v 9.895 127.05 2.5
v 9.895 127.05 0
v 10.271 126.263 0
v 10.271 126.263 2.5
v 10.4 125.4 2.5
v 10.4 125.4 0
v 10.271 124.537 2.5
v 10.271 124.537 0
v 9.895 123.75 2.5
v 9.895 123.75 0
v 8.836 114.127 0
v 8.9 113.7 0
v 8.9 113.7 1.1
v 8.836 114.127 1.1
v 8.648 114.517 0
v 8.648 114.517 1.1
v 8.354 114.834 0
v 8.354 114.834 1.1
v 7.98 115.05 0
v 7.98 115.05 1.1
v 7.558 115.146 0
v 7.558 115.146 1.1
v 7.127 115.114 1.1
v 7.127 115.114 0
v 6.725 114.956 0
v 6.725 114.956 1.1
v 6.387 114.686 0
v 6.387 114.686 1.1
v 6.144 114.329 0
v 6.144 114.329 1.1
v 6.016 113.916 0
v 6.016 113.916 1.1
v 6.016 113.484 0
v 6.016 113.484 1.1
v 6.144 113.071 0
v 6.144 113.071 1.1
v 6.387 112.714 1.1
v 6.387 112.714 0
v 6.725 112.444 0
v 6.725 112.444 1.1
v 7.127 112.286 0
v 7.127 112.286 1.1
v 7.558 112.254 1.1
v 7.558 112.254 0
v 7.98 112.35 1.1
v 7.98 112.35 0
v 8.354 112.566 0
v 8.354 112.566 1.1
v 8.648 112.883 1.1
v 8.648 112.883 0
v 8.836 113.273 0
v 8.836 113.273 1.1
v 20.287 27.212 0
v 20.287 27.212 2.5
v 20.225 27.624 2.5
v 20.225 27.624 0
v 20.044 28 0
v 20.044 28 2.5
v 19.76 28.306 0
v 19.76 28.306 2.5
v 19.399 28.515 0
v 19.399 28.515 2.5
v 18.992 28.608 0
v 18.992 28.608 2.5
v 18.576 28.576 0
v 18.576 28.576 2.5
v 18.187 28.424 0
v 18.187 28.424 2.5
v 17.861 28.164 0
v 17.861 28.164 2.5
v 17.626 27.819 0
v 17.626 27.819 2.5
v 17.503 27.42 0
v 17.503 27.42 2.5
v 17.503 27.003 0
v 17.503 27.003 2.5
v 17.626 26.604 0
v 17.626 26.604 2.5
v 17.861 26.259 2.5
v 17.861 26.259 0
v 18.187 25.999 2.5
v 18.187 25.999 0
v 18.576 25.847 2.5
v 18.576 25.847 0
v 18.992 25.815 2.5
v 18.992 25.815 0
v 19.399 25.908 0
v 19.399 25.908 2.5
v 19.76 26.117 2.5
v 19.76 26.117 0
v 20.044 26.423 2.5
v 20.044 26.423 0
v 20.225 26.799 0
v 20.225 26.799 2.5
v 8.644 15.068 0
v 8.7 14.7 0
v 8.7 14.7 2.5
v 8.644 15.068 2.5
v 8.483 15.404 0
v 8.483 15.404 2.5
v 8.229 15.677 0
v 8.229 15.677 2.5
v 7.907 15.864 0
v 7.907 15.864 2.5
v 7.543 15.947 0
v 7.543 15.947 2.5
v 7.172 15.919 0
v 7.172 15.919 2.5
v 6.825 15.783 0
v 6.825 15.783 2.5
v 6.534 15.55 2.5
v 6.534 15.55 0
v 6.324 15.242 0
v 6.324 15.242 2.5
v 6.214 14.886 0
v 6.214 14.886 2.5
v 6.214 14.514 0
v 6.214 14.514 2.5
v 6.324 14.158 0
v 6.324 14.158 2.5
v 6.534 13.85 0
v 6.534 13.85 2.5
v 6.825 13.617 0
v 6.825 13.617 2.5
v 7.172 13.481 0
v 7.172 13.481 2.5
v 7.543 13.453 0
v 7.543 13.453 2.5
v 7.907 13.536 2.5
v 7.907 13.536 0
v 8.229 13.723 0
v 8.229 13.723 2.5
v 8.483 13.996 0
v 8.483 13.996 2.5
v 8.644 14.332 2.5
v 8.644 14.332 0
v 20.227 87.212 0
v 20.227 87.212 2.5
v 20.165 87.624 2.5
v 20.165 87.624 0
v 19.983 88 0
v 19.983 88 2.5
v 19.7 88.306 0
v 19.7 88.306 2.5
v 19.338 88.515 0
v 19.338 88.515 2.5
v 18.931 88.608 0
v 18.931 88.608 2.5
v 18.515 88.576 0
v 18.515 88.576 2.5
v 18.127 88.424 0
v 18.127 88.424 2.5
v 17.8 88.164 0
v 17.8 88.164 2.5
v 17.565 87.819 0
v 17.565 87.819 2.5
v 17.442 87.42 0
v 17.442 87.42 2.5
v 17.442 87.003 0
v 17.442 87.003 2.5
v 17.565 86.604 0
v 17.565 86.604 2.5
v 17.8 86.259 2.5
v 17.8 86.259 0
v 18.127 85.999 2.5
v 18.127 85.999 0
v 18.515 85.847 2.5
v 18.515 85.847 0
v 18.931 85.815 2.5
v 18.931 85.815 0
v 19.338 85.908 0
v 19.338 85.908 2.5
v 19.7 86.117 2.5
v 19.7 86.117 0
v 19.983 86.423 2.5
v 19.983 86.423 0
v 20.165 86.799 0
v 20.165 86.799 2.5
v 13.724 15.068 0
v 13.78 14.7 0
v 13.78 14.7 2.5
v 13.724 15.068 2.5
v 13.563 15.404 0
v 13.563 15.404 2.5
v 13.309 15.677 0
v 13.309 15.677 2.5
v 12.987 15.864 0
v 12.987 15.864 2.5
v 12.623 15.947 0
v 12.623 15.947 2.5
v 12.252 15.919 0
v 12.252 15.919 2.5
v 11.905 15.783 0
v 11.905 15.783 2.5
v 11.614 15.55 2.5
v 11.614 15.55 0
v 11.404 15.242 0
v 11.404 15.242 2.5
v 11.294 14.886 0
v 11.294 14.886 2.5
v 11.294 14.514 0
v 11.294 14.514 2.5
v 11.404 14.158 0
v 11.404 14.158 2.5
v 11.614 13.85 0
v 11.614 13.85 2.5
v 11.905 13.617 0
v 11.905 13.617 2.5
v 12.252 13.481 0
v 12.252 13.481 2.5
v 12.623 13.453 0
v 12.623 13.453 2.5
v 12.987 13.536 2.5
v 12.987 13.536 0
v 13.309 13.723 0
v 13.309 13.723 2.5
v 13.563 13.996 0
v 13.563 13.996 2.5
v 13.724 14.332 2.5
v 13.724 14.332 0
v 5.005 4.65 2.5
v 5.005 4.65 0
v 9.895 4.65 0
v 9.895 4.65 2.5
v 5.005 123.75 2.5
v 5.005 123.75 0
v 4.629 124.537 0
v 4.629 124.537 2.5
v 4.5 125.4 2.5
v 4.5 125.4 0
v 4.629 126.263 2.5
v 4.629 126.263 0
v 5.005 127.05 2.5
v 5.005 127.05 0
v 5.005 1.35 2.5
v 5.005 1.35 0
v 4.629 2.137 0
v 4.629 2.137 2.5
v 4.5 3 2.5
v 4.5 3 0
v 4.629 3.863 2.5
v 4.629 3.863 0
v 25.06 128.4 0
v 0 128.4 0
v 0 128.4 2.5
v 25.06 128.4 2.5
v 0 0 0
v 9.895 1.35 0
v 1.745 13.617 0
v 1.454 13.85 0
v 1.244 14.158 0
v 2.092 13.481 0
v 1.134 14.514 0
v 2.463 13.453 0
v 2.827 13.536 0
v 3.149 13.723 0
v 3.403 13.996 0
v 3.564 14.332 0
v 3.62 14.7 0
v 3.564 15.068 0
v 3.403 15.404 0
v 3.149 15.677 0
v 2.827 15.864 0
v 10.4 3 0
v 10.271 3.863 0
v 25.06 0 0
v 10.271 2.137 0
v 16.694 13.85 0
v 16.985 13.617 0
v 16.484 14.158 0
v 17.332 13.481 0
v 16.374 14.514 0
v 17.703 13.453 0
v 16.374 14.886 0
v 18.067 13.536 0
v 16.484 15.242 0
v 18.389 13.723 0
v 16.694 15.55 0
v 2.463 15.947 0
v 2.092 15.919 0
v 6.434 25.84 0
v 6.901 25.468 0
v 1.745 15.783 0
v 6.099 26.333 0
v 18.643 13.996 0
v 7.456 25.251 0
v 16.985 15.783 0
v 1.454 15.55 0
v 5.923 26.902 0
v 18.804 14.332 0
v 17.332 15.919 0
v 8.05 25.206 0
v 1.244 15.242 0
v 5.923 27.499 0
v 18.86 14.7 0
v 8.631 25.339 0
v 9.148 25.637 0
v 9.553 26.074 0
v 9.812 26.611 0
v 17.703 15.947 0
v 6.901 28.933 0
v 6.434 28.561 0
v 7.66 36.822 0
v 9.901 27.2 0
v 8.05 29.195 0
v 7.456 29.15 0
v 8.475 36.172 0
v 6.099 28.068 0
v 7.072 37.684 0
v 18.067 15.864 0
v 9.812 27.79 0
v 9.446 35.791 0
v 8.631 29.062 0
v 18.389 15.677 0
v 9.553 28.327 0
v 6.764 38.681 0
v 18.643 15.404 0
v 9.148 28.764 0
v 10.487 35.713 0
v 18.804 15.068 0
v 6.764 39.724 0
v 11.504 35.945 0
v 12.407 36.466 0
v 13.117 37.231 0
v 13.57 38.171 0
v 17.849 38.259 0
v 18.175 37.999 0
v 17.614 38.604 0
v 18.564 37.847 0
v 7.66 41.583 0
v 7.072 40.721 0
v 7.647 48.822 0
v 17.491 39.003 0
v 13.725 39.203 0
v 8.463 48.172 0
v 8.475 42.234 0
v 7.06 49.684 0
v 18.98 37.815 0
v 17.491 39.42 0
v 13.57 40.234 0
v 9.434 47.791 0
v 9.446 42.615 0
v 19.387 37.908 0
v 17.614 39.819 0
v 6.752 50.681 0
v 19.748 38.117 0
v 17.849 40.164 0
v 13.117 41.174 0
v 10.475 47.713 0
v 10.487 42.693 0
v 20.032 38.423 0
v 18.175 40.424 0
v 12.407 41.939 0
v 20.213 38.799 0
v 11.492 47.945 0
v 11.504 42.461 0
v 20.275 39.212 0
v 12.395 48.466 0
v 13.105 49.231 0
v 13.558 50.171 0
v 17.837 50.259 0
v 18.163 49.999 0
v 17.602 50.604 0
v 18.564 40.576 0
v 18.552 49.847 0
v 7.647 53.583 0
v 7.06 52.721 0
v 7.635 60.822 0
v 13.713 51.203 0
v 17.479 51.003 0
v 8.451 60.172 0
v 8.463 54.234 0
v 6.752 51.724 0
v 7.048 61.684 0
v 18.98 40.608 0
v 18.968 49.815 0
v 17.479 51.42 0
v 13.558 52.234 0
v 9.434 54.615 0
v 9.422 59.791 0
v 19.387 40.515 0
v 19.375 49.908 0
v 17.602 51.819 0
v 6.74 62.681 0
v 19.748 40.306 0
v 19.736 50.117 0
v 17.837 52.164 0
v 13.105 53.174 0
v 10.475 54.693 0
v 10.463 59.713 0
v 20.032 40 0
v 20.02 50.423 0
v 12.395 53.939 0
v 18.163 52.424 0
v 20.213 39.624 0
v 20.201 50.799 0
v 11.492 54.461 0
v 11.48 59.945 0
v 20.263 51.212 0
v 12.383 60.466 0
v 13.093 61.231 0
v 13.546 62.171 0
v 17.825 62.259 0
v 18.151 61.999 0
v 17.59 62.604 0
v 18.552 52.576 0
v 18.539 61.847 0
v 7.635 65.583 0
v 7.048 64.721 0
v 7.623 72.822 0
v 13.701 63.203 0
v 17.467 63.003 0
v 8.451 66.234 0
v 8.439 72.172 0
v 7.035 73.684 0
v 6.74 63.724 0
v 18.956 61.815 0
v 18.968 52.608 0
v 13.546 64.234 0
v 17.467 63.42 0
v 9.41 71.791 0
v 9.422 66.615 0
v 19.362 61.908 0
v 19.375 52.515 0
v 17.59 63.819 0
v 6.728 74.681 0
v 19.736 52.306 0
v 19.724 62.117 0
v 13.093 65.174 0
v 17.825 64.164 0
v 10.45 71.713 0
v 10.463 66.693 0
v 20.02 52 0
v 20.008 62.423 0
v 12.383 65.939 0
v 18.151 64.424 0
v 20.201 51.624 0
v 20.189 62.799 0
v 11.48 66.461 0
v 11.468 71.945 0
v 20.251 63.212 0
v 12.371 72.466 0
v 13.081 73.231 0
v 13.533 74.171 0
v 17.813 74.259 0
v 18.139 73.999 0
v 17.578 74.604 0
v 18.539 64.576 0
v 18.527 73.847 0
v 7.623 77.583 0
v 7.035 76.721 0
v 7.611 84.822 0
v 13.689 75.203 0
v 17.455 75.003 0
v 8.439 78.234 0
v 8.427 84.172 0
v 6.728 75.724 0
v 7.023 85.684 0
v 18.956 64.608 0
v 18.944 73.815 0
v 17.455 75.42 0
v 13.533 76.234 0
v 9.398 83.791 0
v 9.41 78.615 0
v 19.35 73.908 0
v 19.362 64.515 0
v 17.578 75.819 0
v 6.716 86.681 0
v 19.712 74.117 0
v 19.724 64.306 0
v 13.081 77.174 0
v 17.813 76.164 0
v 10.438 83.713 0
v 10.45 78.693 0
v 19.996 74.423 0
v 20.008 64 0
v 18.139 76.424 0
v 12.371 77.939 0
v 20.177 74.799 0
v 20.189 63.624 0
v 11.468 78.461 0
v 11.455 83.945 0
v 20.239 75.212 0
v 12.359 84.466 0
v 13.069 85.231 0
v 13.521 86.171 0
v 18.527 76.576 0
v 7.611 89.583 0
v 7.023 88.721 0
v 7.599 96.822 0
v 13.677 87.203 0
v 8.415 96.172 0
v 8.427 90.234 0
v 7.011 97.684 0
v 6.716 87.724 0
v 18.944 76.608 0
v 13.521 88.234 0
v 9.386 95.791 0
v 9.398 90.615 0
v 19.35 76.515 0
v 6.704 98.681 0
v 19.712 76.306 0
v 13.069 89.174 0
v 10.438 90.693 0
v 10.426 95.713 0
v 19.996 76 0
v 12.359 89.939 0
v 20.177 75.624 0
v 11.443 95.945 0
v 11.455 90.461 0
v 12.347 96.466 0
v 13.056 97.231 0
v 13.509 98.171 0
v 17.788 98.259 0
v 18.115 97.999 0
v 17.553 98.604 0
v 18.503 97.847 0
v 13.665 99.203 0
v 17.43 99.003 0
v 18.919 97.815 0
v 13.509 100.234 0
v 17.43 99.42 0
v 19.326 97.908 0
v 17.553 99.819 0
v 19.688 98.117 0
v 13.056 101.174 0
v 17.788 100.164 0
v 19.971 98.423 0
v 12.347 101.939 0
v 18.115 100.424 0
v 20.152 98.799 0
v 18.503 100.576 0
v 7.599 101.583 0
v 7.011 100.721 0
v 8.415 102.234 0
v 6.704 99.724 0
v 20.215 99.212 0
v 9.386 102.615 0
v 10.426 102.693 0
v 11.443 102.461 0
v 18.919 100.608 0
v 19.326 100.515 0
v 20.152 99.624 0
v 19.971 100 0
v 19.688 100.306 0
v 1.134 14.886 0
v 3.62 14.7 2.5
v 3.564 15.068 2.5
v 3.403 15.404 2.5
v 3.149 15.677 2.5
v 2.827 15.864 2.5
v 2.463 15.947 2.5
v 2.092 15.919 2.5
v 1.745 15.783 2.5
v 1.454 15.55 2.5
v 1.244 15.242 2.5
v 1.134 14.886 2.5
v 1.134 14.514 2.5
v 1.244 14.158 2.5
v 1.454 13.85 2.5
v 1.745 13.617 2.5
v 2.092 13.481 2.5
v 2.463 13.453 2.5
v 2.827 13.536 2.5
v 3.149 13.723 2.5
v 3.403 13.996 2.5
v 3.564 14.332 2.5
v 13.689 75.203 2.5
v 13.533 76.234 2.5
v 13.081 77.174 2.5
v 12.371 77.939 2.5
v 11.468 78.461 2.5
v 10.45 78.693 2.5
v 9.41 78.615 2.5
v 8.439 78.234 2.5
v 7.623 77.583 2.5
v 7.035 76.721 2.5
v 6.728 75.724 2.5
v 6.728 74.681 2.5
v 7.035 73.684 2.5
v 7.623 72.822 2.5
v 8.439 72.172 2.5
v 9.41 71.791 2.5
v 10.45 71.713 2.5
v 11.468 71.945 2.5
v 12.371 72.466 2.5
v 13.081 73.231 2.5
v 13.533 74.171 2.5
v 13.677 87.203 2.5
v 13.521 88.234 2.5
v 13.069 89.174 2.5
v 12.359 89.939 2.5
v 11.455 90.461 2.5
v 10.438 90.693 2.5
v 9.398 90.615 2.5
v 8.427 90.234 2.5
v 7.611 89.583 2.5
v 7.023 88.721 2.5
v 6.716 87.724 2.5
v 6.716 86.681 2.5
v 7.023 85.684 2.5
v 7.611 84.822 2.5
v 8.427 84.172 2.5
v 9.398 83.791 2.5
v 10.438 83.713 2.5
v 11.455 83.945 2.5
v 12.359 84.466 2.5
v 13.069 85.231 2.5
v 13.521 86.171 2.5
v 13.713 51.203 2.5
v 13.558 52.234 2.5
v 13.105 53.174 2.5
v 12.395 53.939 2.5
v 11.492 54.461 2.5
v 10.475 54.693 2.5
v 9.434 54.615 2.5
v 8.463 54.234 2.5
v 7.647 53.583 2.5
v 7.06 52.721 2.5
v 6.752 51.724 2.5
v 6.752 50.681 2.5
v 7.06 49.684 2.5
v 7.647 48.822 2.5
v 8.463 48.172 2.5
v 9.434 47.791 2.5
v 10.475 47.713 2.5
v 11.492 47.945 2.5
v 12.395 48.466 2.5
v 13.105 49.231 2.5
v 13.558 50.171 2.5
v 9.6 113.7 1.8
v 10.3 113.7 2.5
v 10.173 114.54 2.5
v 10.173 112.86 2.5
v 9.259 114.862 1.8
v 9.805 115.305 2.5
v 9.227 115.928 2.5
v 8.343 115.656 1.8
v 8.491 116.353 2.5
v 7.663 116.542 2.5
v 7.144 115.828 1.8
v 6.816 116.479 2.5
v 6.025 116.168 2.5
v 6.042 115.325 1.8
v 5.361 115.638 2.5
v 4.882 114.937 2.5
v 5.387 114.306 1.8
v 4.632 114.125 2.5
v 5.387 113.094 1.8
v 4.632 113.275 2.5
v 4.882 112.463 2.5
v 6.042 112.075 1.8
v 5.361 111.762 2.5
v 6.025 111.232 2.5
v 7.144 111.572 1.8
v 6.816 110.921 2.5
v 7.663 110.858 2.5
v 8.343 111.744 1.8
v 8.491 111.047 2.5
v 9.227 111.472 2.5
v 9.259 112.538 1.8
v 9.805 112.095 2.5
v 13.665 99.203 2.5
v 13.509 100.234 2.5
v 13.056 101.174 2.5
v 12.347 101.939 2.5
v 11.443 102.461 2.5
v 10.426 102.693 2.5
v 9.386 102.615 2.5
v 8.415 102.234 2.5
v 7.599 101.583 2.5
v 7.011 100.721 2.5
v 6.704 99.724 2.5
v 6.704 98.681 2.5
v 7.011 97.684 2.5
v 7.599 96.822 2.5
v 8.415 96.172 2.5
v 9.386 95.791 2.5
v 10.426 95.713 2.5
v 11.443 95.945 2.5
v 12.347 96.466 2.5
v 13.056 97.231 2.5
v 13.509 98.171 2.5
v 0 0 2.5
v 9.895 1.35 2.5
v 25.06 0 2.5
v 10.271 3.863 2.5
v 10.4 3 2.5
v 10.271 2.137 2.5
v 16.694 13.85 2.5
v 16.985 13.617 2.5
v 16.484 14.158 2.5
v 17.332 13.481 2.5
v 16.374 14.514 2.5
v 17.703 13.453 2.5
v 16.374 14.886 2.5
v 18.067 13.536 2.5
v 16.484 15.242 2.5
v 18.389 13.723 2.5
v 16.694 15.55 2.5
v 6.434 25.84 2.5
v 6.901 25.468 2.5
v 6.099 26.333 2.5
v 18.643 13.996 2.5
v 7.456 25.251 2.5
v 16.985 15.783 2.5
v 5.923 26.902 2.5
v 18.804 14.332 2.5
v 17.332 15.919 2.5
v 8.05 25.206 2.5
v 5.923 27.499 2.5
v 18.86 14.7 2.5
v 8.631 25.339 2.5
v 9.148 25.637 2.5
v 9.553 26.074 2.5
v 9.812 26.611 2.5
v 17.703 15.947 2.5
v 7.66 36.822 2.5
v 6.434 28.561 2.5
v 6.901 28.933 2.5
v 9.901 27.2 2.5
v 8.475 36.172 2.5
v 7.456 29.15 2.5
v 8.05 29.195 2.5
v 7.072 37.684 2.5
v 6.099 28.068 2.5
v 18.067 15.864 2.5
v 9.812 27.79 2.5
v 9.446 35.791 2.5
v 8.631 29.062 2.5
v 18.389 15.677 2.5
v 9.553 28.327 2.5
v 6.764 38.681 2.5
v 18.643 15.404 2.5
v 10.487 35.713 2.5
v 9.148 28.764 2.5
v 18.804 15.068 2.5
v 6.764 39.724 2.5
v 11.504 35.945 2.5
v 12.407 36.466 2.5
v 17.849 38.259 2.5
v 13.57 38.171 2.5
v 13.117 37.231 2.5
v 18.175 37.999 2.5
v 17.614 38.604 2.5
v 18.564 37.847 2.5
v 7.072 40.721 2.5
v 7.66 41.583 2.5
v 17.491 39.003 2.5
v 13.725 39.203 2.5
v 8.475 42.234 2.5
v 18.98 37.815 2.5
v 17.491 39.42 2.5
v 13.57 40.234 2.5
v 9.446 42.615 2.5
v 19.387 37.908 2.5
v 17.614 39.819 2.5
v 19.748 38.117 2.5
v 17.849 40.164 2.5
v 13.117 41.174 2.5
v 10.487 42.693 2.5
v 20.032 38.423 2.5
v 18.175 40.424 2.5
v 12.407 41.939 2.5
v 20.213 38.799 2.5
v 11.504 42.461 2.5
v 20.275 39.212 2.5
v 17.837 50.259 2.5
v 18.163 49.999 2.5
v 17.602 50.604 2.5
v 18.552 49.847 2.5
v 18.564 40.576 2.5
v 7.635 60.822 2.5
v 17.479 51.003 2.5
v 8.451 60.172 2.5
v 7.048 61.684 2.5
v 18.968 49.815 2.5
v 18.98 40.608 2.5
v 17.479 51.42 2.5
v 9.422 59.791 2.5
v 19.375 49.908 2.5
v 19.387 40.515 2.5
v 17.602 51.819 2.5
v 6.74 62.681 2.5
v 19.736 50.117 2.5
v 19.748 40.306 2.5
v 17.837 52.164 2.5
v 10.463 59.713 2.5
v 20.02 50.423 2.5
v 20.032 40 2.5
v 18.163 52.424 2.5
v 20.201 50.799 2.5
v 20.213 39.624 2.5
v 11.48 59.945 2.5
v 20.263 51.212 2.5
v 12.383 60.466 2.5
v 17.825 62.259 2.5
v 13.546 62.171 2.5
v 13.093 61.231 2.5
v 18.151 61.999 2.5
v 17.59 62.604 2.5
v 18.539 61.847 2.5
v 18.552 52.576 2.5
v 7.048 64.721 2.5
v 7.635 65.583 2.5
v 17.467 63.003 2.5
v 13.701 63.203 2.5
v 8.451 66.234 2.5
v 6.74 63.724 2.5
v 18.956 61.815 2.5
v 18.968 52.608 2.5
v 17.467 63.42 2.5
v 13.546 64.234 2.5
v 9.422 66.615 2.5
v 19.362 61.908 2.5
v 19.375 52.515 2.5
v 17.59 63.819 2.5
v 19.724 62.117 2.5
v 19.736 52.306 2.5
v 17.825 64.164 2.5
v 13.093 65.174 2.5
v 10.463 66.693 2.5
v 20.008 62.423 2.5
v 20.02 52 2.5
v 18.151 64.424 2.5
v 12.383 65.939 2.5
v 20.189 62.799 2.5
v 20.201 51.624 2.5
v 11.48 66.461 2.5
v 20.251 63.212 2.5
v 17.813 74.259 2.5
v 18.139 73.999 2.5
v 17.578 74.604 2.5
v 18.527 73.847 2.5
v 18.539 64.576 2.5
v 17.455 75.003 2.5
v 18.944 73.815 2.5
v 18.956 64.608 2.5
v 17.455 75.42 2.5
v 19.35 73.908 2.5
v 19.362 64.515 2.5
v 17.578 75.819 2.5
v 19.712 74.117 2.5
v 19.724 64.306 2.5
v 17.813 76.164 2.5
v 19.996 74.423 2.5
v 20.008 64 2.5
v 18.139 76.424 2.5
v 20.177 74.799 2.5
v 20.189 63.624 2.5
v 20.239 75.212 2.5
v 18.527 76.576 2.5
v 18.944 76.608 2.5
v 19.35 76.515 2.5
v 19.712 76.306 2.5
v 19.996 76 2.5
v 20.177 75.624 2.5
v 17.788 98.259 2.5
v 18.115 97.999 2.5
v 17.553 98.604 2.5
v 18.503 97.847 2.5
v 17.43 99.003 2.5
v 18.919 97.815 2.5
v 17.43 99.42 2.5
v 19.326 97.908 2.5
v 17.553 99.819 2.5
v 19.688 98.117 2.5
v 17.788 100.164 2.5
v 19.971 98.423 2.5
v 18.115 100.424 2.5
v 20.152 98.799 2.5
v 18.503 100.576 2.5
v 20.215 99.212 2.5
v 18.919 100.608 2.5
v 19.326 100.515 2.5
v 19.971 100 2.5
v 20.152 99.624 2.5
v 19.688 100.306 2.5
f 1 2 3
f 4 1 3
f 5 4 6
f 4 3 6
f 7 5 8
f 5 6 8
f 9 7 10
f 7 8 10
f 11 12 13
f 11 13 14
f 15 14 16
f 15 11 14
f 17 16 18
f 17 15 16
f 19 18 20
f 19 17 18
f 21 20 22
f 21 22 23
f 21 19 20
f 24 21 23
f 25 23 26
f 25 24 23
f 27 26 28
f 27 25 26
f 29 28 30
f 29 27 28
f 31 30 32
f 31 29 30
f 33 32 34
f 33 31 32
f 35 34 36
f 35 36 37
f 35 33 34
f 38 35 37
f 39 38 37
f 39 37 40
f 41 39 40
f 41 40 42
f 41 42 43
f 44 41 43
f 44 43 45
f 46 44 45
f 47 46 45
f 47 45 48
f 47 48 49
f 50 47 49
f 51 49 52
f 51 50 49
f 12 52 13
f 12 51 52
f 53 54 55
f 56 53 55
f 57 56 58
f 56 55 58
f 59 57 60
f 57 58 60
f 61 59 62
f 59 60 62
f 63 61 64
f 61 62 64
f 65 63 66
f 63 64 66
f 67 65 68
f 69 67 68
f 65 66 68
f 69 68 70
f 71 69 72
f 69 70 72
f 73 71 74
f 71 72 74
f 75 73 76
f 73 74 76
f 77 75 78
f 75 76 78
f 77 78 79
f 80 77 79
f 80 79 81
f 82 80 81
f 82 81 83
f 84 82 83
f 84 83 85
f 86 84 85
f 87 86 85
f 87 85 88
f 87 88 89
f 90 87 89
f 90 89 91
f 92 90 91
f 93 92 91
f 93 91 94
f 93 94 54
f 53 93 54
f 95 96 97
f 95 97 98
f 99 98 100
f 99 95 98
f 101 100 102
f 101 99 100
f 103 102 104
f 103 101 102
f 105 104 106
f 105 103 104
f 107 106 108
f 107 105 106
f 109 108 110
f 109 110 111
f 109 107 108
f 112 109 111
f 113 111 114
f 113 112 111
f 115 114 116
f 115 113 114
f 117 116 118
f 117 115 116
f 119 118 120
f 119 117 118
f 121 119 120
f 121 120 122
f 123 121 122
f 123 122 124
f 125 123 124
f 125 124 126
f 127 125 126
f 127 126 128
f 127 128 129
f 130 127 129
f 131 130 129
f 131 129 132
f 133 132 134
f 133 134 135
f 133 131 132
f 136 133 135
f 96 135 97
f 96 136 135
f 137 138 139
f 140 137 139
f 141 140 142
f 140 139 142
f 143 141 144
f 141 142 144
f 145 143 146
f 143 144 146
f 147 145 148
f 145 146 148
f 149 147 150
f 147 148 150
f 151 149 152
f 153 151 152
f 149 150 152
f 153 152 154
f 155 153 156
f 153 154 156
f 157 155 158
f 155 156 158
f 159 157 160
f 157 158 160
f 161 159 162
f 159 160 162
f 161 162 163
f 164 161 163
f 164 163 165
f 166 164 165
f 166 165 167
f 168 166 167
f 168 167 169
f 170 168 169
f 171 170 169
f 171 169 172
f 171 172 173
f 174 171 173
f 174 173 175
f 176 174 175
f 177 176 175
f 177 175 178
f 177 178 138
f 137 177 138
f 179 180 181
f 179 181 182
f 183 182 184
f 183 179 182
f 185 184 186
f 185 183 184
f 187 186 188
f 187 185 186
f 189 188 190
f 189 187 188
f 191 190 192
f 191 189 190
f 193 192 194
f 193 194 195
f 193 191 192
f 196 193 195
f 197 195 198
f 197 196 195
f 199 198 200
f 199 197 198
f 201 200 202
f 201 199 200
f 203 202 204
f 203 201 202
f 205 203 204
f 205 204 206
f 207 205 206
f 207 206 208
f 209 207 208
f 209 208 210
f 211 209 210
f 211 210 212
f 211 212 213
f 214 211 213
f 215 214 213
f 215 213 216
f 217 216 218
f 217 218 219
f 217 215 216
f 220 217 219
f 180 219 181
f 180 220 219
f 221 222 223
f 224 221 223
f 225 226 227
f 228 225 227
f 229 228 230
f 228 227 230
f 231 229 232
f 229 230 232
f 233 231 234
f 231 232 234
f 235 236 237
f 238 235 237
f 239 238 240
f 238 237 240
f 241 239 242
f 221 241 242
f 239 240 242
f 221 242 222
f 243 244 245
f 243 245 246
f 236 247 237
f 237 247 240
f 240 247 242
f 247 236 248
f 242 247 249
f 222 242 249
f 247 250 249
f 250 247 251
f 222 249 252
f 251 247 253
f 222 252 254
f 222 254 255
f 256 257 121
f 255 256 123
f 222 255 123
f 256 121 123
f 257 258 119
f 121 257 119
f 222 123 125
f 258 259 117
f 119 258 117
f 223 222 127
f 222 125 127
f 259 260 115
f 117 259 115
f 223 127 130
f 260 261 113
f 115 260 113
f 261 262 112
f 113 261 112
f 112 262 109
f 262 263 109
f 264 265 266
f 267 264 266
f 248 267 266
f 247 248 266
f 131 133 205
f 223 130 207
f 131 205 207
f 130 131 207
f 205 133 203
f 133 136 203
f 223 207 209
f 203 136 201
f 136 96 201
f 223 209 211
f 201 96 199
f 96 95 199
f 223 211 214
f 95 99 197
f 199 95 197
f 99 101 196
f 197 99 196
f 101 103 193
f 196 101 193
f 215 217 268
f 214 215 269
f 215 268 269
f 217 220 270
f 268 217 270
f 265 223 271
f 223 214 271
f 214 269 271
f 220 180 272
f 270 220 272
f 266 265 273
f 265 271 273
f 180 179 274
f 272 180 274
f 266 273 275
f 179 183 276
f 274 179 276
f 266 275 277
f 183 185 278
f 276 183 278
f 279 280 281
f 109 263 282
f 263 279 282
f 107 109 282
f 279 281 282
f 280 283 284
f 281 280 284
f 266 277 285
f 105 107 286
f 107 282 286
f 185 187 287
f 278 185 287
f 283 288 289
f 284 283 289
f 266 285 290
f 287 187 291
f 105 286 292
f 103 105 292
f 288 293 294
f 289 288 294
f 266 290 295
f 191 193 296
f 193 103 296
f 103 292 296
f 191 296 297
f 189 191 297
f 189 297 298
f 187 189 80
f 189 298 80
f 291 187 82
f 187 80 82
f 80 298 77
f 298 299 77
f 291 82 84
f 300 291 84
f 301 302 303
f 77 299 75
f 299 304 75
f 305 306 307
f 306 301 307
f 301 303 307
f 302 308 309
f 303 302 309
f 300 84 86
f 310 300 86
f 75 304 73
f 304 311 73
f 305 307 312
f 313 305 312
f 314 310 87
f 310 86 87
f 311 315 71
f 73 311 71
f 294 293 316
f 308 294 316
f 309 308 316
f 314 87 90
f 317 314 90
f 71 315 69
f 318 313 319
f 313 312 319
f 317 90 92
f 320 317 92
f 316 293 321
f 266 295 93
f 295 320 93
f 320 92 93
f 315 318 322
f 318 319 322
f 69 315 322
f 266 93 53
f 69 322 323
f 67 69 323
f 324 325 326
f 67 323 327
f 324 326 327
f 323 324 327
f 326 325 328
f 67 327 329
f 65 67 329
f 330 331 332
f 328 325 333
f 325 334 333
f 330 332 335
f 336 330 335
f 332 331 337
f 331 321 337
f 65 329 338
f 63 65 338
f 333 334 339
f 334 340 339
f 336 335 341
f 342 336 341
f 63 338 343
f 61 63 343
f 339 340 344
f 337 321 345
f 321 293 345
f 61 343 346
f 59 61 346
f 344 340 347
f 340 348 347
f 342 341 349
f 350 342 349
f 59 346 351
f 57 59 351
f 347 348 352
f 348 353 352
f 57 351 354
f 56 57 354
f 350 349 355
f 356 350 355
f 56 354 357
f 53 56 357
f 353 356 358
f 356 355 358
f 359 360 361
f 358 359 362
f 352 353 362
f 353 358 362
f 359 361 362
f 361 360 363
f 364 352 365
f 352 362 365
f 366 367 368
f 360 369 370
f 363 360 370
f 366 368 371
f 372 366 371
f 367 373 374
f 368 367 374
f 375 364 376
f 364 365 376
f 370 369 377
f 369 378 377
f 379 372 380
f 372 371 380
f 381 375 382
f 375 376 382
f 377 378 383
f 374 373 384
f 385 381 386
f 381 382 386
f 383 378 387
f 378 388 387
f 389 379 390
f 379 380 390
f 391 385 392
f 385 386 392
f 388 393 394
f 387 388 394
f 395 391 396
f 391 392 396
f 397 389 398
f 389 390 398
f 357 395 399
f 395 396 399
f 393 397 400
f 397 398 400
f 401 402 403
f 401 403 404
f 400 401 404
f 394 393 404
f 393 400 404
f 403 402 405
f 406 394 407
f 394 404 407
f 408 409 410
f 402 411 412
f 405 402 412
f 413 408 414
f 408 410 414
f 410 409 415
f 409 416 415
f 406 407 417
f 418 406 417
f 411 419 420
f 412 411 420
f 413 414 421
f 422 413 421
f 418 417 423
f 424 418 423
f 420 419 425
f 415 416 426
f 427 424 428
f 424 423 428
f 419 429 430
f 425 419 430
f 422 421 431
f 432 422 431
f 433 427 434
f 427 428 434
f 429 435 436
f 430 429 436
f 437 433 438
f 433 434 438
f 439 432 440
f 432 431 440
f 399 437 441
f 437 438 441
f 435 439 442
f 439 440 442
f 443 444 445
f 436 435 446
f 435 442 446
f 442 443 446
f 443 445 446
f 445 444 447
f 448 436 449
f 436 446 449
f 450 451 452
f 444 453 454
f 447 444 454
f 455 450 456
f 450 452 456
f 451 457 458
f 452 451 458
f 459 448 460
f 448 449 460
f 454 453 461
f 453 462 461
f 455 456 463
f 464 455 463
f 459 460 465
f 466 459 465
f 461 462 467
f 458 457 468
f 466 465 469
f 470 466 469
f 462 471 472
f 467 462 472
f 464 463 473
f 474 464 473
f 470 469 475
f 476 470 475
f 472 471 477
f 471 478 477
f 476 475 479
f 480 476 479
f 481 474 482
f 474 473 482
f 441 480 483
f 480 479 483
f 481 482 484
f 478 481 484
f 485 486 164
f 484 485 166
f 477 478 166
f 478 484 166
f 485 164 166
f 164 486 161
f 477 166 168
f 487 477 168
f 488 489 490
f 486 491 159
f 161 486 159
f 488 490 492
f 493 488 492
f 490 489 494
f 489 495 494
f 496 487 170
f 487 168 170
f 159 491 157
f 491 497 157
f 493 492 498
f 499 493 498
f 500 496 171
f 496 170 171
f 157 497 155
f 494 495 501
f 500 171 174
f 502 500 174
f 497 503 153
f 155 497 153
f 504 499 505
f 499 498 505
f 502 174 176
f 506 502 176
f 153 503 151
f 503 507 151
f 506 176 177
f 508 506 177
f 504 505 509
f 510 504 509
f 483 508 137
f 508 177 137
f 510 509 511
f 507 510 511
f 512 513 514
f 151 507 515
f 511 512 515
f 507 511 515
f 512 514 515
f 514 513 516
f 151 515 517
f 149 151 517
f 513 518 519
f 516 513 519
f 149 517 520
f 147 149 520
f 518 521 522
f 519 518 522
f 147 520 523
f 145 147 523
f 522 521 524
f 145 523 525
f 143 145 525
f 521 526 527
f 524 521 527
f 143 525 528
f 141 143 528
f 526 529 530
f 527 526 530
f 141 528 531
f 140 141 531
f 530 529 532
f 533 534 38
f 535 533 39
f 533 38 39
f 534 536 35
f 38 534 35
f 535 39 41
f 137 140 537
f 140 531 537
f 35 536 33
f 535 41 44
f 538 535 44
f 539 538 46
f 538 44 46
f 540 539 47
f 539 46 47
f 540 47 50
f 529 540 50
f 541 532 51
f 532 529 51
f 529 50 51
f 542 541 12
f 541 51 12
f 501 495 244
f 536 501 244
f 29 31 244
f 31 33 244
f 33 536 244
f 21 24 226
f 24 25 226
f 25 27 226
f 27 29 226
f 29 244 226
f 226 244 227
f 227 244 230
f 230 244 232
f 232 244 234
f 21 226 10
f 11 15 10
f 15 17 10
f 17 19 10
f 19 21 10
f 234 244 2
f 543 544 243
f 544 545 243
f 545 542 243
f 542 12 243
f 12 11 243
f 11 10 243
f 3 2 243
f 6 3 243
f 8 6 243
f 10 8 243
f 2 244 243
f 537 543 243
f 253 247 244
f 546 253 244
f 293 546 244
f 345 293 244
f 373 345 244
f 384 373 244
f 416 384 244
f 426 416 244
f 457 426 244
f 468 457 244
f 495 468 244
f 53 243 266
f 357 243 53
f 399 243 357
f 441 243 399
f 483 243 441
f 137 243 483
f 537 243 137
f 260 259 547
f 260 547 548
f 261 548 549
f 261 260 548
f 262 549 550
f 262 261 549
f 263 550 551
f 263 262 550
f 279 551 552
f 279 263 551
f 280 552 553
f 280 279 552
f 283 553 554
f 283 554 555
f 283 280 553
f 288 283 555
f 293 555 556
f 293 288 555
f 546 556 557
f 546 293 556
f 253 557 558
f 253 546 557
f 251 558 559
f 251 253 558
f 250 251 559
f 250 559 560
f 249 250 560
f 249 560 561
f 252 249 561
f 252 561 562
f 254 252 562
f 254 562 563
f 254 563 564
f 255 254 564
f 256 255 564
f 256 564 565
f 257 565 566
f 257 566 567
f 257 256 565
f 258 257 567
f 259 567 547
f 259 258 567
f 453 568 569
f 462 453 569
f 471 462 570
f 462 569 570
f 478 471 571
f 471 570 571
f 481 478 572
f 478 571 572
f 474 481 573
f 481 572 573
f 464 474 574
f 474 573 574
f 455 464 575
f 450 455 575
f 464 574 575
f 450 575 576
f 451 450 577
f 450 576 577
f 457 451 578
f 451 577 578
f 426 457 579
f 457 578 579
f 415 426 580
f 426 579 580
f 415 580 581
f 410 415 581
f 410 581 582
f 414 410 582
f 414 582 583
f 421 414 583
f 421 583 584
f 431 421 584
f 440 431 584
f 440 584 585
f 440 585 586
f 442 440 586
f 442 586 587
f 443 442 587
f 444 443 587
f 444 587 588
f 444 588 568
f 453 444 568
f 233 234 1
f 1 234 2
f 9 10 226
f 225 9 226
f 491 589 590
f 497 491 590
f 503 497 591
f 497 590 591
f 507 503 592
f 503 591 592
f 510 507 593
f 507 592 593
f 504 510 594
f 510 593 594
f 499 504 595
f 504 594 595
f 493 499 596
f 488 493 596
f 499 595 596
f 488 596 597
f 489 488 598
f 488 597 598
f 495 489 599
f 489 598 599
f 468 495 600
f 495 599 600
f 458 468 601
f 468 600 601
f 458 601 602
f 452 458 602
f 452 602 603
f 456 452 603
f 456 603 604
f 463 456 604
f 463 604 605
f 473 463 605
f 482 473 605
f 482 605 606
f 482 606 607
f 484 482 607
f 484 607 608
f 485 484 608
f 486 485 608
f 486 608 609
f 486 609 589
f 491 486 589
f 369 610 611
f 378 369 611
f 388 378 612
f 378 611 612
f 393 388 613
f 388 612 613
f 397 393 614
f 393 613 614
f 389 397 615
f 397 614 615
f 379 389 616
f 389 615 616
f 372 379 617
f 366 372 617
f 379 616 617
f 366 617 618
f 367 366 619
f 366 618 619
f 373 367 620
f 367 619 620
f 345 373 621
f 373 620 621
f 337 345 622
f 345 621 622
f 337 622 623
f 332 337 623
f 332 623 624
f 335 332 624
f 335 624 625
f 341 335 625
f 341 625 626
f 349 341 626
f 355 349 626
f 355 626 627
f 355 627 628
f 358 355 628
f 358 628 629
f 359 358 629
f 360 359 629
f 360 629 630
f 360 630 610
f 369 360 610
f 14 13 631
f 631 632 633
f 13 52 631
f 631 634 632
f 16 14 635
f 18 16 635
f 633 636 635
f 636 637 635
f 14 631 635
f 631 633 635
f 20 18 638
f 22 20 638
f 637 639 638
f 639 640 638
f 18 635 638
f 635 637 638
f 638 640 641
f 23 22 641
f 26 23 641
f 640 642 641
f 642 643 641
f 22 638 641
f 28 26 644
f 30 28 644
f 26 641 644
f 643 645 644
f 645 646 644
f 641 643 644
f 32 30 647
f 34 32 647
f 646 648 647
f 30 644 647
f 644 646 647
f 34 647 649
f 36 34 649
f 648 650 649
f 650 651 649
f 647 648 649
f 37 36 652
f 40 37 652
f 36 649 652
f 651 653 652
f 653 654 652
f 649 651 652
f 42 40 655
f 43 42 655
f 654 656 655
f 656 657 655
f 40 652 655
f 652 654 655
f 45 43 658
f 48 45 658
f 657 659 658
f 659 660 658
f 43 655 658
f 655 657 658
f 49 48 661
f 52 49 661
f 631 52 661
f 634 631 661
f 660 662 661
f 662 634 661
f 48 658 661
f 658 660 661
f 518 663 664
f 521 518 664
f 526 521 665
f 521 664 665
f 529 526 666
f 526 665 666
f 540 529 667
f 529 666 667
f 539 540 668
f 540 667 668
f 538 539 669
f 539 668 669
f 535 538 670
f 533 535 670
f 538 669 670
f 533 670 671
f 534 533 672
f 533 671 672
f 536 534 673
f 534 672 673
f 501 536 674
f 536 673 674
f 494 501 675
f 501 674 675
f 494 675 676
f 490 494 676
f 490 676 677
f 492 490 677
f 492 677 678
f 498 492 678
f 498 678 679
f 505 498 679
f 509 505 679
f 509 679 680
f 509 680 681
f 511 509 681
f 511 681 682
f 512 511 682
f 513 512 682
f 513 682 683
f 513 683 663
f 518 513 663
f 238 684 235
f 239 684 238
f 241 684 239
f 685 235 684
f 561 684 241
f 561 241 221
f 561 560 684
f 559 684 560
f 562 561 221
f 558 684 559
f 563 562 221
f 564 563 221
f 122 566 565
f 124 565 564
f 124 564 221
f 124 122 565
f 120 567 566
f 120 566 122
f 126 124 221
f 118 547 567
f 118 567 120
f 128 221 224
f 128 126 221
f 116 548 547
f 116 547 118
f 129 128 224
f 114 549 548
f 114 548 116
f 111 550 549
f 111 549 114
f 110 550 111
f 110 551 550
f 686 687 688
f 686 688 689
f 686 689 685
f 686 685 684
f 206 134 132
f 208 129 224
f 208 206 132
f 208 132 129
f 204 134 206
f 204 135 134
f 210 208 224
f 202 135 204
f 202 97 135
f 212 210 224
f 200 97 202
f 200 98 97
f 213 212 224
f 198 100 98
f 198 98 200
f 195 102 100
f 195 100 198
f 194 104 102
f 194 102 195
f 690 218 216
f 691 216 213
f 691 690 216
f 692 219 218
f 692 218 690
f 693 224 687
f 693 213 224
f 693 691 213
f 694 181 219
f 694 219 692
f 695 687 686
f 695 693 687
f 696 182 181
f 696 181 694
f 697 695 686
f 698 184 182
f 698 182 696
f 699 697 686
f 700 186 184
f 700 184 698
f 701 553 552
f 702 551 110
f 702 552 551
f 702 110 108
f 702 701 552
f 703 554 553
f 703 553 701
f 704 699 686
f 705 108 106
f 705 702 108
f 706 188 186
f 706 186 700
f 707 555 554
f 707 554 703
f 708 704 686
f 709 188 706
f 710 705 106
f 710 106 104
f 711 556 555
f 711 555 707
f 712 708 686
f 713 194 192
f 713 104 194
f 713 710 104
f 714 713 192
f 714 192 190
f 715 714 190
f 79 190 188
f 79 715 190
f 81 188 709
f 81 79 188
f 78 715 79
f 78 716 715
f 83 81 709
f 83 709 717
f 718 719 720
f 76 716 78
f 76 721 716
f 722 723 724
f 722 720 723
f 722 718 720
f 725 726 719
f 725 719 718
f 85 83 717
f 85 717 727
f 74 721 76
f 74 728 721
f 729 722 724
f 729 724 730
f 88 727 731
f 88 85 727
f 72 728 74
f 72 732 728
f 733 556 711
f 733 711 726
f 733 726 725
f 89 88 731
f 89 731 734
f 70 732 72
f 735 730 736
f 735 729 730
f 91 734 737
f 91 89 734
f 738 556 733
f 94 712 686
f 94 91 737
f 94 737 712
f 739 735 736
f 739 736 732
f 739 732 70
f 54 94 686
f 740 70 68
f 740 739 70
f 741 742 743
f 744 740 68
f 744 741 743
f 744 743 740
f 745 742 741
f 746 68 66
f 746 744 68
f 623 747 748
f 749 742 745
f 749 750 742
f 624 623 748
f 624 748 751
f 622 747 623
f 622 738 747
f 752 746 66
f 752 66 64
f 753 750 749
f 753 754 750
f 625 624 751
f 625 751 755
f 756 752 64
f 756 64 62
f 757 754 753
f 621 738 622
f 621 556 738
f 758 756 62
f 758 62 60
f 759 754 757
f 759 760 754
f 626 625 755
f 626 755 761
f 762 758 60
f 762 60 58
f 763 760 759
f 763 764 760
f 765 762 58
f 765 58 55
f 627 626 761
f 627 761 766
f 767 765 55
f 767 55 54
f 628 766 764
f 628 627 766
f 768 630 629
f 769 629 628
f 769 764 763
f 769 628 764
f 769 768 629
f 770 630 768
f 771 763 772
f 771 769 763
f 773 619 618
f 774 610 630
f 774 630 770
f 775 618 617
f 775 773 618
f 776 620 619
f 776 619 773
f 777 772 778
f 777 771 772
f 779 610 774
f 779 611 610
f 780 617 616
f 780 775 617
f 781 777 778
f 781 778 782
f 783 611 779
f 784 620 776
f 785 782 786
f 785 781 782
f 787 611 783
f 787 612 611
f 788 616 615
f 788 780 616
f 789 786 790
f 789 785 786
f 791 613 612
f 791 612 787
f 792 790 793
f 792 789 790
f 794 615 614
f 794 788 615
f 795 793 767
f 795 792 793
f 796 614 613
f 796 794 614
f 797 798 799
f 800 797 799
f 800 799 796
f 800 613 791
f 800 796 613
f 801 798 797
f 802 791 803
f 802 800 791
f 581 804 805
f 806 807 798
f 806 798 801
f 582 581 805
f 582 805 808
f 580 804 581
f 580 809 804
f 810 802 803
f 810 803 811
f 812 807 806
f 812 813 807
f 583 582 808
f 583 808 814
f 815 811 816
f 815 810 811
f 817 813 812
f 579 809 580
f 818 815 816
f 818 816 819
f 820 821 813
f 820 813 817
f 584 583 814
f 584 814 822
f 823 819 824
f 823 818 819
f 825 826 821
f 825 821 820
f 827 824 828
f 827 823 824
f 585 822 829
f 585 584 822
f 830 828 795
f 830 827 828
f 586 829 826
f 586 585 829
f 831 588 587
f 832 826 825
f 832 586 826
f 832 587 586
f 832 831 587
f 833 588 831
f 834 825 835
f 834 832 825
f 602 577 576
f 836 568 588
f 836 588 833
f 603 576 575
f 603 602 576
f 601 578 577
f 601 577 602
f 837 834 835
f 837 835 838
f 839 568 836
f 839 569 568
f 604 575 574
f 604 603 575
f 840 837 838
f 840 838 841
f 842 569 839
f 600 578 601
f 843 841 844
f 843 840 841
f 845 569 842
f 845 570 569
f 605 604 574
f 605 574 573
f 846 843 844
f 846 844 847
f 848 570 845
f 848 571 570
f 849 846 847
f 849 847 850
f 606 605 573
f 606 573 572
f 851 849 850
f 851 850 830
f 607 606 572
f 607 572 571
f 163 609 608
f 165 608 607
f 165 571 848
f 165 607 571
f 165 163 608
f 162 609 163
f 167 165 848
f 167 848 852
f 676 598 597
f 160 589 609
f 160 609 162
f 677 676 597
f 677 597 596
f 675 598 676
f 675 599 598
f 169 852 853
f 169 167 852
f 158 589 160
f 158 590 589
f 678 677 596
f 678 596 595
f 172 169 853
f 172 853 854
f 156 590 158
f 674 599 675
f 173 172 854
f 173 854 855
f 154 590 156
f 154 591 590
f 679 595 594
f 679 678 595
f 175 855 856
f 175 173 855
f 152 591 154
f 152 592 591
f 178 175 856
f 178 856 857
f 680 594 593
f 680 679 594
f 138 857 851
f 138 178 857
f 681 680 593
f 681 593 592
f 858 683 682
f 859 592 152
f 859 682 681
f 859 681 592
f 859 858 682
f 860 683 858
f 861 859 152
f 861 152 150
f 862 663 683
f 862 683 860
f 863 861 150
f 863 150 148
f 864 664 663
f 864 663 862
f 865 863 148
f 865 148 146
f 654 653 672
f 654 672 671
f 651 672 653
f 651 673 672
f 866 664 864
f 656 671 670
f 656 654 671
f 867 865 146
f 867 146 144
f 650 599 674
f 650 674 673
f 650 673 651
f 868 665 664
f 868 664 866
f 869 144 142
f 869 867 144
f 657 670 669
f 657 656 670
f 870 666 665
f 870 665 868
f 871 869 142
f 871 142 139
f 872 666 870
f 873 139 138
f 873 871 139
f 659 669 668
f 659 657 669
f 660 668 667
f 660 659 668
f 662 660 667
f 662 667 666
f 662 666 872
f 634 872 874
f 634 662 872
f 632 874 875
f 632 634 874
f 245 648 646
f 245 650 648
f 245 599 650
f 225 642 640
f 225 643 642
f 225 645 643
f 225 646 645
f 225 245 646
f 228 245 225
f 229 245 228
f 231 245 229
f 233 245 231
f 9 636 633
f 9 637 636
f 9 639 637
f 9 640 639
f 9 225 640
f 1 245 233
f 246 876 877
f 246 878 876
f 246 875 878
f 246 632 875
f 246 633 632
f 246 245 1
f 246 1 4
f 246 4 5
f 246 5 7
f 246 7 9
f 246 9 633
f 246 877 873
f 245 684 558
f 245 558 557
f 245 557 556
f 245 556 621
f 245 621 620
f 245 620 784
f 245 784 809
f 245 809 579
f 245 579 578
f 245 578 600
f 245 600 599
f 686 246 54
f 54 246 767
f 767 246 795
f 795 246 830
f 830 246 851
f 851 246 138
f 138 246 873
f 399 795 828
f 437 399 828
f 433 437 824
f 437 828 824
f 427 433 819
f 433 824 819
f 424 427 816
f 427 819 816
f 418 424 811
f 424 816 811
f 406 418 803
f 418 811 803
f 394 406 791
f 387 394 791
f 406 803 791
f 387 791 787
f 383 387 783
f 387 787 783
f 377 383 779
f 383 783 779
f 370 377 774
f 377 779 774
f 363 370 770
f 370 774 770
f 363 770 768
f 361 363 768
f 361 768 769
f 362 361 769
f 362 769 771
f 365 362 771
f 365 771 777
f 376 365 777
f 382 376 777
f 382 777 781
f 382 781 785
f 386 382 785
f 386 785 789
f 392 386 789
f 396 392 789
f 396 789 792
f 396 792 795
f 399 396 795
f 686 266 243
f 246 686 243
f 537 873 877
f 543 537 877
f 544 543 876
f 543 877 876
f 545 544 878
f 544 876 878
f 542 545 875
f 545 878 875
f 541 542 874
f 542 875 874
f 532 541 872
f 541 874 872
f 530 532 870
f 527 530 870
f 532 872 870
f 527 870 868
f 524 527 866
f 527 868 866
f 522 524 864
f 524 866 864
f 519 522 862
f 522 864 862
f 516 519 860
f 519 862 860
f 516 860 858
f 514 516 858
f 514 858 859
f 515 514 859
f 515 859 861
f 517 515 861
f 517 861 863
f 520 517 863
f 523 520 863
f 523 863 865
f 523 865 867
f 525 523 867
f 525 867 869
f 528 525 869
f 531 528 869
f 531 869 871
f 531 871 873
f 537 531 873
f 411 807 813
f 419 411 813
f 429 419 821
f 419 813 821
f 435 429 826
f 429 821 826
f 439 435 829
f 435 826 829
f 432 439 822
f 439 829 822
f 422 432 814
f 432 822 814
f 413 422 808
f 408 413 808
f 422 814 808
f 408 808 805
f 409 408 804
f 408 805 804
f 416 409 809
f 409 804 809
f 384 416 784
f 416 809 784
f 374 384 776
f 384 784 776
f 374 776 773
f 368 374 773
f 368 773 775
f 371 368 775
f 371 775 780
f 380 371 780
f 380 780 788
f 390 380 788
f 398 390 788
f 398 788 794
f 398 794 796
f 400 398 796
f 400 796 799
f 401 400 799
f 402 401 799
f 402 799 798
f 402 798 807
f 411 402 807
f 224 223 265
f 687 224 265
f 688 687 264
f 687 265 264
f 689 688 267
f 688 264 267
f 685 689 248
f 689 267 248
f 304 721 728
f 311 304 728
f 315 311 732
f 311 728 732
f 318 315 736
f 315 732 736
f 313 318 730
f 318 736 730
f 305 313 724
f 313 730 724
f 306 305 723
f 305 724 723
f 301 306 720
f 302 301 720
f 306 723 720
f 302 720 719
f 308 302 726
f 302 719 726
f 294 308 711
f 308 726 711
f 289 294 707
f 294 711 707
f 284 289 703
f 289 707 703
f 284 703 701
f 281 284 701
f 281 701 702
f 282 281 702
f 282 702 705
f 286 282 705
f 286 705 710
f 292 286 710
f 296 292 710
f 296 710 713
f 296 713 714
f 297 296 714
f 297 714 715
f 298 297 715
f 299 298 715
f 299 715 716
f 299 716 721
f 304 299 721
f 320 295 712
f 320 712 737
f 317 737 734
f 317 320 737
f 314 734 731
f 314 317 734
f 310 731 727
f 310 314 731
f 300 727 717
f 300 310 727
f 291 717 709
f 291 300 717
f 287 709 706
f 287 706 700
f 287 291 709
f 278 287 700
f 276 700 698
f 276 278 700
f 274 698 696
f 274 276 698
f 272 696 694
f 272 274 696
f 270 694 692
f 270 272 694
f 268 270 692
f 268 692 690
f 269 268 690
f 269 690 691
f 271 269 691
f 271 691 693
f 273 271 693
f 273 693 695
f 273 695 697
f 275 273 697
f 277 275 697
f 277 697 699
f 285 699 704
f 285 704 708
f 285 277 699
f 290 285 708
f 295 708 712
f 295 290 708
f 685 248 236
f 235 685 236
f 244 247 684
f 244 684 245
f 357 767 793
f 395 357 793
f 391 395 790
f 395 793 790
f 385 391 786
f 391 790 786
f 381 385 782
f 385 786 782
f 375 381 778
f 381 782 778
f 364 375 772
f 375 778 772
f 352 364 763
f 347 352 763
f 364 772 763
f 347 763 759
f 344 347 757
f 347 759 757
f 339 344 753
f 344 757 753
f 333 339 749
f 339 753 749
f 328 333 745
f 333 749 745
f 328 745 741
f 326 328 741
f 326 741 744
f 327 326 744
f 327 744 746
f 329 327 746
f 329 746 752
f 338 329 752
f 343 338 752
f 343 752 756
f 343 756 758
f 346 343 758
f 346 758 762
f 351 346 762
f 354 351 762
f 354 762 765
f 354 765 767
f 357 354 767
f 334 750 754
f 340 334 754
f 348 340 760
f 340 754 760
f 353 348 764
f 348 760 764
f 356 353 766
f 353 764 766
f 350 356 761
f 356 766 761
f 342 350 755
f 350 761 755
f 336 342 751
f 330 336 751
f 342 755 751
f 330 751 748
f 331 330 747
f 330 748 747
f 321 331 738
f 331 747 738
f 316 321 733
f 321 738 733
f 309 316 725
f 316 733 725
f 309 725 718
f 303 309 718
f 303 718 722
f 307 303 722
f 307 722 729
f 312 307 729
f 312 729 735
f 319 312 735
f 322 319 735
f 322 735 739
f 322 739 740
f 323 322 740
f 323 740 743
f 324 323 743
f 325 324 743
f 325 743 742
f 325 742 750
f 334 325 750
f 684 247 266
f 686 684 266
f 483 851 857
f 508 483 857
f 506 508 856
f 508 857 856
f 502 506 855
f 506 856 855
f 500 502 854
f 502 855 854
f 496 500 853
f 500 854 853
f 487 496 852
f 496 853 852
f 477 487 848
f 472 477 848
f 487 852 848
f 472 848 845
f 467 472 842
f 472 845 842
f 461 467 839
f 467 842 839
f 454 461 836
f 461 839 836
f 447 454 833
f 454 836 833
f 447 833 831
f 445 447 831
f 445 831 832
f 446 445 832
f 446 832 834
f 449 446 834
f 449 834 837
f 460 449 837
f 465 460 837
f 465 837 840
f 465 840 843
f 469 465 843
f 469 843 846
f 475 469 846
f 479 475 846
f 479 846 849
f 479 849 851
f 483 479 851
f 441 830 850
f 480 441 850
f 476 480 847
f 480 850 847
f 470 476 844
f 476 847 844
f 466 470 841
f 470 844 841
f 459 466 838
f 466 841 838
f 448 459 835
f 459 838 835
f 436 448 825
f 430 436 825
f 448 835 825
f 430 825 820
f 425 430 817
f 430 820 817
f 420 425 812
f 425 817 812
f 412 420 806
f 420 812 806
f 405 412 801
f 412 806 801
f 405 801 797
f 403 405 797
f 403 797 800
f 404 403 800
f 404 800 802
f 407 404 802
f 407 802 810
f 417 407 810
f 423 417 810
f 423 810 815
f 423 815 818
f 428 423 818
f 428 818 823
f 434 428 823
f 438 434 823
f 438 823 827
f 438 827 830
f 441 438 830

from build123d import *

# Parameters (mm, degrees)
MODEL_W                 = 25.06
MODEL_H                 = 128.4
MODEL_R                 = 1.25
MODEL_R_2               = 1.45
BOSS_EXTRU_1_DEPTH      = 2.5
CHANFREIN1_SIZE         = 1.4
ESQUISSE1_R             = 1.4
ESQUISSE1_R_2           = 3.5
ESQUISSE1_R_3           = 2
ENL_V_MAT_EXTRU_1_DEPTH = 131.846526893


with BuildPart() as part:
    # Model → Boss.-Extru.1 (new body)
    with BuildSketch(Plane.XY):
        with Locations((12.53, 64.2)):
            Rectangle(MODEL_W, MODEL_H)
        with Locations((2.37, 14.7)):
            Circle(MODEL_R, mode=Mode.SUBTRACT)
        with Locations((12.53, 14.7)):
            Circle(MODEL_R, mode=Mode.SUBTRACT)
        with Locations((7.45, 14.7)):
            Circle(MODEL_R, mode=Mode.SUBTRACT)
        with Locations((7.45, 113.7)):
            Circle(MODEL_R_2, mode=Mode.SUBTRACT)
        with Locations((17.61, 14.7)):
            Circle(MODEL_R, mode=Mode.SUBTRACT)
        with BuildLine():
            Line((9.895403852, 123.75), (5.004596148, 123.75))
            ThreePointArc((5.004596148, 123.75), (4.5, 125.4), (5.004596148, 127.05))
            Line((5.004596148, 127.05), (9.895403852, 127.05))
            ThreePointArc((9.895403852, 127.05), (10.4, 125.4), (9.895403852, 123.75))
        make_face(mode=Mode.SUBTRACT)
        with BuildLine():
            Line((9.895403852, 1.35), (5.004596148, 1.35))
            ThreePointArc((5.004596148, 1.35), (4.5, 3), (5.004596148, 4.65))
            Line((5.004596148, 4.65), (9.895403852, 4.65))
            ThreePointArc((9.895403852, 4.65), (10.4, 3), (9.895403852, 1.35))
        make_face(mode=Mode.SUBTRACT)
    extrude(amount=BOSS_EXTRU_1_DEPTH)

    # Chanfrein1
    chanfrein1_edges = [part.edges().sort_by_distance(p)[0] for p in [
        (6, 113.7, 2.5),
    ]]
    chamfer(chanfrein1_edges, length=CHANFREIN1_SIZE)

    # Esquisse1 → Enlèv. mat.-Extru.1 (cut, through all)
    with BuildSketch(Plane.XY.offset(2.5)):
        with Locations((18.81464069, 99.211522536)):
            Circle(ESQUISSE1_R)
        with Locations((18.826761896, 87.211528658)):
            Circle(ESQUISSE1_R)
        with Locations((18.838883102, 75.21153478)):
            Circle(ESQUISSE1_R)
        with Locations((18.851004308, 63.211540902)):
            Circle(ESQUISSE1_R)
        with Locations((18.863125514, 51.211547023)):
            Circle(ESQUISSE1_R)
        with Locations((18.875246719, 39.211553145)):
            Circle(ESQUISSE1_R)
        with Locations((18.887367925, 27.211559267)):
            Circle(ESQUISSE1_R)
        with Locations((10.16464508, 99.202785174)):
            Circle(ESQUISSE1_R_2)
        with Locations((10.176766286, 87.202791295)):
            Circle(ESQUISSE1_R_2)
        with Locations((10.188887492, 75.202797417)):
            Circle(ESQUISSE1_R_2)
        with Locations((10.201008698, 63.202803539)):
            Circle(ESQUISSE1_R_2)
        with Locations((10.213129904, 51.202809661)):
            Circle(ESQUISSE1_R_2)
        with Locations((10.225251109, 39.202815783)):
            Circle(ESQUISSE1_R_2)
        with Locations((7.900573508, 27.200461502)):
            Circle(ESQUISSE1_R_3)
    extrude(amount=-ENL_V_MAT_EXTRU_1_DEPTH, mode=Mode.SUBTRACT)


solid = part.part
